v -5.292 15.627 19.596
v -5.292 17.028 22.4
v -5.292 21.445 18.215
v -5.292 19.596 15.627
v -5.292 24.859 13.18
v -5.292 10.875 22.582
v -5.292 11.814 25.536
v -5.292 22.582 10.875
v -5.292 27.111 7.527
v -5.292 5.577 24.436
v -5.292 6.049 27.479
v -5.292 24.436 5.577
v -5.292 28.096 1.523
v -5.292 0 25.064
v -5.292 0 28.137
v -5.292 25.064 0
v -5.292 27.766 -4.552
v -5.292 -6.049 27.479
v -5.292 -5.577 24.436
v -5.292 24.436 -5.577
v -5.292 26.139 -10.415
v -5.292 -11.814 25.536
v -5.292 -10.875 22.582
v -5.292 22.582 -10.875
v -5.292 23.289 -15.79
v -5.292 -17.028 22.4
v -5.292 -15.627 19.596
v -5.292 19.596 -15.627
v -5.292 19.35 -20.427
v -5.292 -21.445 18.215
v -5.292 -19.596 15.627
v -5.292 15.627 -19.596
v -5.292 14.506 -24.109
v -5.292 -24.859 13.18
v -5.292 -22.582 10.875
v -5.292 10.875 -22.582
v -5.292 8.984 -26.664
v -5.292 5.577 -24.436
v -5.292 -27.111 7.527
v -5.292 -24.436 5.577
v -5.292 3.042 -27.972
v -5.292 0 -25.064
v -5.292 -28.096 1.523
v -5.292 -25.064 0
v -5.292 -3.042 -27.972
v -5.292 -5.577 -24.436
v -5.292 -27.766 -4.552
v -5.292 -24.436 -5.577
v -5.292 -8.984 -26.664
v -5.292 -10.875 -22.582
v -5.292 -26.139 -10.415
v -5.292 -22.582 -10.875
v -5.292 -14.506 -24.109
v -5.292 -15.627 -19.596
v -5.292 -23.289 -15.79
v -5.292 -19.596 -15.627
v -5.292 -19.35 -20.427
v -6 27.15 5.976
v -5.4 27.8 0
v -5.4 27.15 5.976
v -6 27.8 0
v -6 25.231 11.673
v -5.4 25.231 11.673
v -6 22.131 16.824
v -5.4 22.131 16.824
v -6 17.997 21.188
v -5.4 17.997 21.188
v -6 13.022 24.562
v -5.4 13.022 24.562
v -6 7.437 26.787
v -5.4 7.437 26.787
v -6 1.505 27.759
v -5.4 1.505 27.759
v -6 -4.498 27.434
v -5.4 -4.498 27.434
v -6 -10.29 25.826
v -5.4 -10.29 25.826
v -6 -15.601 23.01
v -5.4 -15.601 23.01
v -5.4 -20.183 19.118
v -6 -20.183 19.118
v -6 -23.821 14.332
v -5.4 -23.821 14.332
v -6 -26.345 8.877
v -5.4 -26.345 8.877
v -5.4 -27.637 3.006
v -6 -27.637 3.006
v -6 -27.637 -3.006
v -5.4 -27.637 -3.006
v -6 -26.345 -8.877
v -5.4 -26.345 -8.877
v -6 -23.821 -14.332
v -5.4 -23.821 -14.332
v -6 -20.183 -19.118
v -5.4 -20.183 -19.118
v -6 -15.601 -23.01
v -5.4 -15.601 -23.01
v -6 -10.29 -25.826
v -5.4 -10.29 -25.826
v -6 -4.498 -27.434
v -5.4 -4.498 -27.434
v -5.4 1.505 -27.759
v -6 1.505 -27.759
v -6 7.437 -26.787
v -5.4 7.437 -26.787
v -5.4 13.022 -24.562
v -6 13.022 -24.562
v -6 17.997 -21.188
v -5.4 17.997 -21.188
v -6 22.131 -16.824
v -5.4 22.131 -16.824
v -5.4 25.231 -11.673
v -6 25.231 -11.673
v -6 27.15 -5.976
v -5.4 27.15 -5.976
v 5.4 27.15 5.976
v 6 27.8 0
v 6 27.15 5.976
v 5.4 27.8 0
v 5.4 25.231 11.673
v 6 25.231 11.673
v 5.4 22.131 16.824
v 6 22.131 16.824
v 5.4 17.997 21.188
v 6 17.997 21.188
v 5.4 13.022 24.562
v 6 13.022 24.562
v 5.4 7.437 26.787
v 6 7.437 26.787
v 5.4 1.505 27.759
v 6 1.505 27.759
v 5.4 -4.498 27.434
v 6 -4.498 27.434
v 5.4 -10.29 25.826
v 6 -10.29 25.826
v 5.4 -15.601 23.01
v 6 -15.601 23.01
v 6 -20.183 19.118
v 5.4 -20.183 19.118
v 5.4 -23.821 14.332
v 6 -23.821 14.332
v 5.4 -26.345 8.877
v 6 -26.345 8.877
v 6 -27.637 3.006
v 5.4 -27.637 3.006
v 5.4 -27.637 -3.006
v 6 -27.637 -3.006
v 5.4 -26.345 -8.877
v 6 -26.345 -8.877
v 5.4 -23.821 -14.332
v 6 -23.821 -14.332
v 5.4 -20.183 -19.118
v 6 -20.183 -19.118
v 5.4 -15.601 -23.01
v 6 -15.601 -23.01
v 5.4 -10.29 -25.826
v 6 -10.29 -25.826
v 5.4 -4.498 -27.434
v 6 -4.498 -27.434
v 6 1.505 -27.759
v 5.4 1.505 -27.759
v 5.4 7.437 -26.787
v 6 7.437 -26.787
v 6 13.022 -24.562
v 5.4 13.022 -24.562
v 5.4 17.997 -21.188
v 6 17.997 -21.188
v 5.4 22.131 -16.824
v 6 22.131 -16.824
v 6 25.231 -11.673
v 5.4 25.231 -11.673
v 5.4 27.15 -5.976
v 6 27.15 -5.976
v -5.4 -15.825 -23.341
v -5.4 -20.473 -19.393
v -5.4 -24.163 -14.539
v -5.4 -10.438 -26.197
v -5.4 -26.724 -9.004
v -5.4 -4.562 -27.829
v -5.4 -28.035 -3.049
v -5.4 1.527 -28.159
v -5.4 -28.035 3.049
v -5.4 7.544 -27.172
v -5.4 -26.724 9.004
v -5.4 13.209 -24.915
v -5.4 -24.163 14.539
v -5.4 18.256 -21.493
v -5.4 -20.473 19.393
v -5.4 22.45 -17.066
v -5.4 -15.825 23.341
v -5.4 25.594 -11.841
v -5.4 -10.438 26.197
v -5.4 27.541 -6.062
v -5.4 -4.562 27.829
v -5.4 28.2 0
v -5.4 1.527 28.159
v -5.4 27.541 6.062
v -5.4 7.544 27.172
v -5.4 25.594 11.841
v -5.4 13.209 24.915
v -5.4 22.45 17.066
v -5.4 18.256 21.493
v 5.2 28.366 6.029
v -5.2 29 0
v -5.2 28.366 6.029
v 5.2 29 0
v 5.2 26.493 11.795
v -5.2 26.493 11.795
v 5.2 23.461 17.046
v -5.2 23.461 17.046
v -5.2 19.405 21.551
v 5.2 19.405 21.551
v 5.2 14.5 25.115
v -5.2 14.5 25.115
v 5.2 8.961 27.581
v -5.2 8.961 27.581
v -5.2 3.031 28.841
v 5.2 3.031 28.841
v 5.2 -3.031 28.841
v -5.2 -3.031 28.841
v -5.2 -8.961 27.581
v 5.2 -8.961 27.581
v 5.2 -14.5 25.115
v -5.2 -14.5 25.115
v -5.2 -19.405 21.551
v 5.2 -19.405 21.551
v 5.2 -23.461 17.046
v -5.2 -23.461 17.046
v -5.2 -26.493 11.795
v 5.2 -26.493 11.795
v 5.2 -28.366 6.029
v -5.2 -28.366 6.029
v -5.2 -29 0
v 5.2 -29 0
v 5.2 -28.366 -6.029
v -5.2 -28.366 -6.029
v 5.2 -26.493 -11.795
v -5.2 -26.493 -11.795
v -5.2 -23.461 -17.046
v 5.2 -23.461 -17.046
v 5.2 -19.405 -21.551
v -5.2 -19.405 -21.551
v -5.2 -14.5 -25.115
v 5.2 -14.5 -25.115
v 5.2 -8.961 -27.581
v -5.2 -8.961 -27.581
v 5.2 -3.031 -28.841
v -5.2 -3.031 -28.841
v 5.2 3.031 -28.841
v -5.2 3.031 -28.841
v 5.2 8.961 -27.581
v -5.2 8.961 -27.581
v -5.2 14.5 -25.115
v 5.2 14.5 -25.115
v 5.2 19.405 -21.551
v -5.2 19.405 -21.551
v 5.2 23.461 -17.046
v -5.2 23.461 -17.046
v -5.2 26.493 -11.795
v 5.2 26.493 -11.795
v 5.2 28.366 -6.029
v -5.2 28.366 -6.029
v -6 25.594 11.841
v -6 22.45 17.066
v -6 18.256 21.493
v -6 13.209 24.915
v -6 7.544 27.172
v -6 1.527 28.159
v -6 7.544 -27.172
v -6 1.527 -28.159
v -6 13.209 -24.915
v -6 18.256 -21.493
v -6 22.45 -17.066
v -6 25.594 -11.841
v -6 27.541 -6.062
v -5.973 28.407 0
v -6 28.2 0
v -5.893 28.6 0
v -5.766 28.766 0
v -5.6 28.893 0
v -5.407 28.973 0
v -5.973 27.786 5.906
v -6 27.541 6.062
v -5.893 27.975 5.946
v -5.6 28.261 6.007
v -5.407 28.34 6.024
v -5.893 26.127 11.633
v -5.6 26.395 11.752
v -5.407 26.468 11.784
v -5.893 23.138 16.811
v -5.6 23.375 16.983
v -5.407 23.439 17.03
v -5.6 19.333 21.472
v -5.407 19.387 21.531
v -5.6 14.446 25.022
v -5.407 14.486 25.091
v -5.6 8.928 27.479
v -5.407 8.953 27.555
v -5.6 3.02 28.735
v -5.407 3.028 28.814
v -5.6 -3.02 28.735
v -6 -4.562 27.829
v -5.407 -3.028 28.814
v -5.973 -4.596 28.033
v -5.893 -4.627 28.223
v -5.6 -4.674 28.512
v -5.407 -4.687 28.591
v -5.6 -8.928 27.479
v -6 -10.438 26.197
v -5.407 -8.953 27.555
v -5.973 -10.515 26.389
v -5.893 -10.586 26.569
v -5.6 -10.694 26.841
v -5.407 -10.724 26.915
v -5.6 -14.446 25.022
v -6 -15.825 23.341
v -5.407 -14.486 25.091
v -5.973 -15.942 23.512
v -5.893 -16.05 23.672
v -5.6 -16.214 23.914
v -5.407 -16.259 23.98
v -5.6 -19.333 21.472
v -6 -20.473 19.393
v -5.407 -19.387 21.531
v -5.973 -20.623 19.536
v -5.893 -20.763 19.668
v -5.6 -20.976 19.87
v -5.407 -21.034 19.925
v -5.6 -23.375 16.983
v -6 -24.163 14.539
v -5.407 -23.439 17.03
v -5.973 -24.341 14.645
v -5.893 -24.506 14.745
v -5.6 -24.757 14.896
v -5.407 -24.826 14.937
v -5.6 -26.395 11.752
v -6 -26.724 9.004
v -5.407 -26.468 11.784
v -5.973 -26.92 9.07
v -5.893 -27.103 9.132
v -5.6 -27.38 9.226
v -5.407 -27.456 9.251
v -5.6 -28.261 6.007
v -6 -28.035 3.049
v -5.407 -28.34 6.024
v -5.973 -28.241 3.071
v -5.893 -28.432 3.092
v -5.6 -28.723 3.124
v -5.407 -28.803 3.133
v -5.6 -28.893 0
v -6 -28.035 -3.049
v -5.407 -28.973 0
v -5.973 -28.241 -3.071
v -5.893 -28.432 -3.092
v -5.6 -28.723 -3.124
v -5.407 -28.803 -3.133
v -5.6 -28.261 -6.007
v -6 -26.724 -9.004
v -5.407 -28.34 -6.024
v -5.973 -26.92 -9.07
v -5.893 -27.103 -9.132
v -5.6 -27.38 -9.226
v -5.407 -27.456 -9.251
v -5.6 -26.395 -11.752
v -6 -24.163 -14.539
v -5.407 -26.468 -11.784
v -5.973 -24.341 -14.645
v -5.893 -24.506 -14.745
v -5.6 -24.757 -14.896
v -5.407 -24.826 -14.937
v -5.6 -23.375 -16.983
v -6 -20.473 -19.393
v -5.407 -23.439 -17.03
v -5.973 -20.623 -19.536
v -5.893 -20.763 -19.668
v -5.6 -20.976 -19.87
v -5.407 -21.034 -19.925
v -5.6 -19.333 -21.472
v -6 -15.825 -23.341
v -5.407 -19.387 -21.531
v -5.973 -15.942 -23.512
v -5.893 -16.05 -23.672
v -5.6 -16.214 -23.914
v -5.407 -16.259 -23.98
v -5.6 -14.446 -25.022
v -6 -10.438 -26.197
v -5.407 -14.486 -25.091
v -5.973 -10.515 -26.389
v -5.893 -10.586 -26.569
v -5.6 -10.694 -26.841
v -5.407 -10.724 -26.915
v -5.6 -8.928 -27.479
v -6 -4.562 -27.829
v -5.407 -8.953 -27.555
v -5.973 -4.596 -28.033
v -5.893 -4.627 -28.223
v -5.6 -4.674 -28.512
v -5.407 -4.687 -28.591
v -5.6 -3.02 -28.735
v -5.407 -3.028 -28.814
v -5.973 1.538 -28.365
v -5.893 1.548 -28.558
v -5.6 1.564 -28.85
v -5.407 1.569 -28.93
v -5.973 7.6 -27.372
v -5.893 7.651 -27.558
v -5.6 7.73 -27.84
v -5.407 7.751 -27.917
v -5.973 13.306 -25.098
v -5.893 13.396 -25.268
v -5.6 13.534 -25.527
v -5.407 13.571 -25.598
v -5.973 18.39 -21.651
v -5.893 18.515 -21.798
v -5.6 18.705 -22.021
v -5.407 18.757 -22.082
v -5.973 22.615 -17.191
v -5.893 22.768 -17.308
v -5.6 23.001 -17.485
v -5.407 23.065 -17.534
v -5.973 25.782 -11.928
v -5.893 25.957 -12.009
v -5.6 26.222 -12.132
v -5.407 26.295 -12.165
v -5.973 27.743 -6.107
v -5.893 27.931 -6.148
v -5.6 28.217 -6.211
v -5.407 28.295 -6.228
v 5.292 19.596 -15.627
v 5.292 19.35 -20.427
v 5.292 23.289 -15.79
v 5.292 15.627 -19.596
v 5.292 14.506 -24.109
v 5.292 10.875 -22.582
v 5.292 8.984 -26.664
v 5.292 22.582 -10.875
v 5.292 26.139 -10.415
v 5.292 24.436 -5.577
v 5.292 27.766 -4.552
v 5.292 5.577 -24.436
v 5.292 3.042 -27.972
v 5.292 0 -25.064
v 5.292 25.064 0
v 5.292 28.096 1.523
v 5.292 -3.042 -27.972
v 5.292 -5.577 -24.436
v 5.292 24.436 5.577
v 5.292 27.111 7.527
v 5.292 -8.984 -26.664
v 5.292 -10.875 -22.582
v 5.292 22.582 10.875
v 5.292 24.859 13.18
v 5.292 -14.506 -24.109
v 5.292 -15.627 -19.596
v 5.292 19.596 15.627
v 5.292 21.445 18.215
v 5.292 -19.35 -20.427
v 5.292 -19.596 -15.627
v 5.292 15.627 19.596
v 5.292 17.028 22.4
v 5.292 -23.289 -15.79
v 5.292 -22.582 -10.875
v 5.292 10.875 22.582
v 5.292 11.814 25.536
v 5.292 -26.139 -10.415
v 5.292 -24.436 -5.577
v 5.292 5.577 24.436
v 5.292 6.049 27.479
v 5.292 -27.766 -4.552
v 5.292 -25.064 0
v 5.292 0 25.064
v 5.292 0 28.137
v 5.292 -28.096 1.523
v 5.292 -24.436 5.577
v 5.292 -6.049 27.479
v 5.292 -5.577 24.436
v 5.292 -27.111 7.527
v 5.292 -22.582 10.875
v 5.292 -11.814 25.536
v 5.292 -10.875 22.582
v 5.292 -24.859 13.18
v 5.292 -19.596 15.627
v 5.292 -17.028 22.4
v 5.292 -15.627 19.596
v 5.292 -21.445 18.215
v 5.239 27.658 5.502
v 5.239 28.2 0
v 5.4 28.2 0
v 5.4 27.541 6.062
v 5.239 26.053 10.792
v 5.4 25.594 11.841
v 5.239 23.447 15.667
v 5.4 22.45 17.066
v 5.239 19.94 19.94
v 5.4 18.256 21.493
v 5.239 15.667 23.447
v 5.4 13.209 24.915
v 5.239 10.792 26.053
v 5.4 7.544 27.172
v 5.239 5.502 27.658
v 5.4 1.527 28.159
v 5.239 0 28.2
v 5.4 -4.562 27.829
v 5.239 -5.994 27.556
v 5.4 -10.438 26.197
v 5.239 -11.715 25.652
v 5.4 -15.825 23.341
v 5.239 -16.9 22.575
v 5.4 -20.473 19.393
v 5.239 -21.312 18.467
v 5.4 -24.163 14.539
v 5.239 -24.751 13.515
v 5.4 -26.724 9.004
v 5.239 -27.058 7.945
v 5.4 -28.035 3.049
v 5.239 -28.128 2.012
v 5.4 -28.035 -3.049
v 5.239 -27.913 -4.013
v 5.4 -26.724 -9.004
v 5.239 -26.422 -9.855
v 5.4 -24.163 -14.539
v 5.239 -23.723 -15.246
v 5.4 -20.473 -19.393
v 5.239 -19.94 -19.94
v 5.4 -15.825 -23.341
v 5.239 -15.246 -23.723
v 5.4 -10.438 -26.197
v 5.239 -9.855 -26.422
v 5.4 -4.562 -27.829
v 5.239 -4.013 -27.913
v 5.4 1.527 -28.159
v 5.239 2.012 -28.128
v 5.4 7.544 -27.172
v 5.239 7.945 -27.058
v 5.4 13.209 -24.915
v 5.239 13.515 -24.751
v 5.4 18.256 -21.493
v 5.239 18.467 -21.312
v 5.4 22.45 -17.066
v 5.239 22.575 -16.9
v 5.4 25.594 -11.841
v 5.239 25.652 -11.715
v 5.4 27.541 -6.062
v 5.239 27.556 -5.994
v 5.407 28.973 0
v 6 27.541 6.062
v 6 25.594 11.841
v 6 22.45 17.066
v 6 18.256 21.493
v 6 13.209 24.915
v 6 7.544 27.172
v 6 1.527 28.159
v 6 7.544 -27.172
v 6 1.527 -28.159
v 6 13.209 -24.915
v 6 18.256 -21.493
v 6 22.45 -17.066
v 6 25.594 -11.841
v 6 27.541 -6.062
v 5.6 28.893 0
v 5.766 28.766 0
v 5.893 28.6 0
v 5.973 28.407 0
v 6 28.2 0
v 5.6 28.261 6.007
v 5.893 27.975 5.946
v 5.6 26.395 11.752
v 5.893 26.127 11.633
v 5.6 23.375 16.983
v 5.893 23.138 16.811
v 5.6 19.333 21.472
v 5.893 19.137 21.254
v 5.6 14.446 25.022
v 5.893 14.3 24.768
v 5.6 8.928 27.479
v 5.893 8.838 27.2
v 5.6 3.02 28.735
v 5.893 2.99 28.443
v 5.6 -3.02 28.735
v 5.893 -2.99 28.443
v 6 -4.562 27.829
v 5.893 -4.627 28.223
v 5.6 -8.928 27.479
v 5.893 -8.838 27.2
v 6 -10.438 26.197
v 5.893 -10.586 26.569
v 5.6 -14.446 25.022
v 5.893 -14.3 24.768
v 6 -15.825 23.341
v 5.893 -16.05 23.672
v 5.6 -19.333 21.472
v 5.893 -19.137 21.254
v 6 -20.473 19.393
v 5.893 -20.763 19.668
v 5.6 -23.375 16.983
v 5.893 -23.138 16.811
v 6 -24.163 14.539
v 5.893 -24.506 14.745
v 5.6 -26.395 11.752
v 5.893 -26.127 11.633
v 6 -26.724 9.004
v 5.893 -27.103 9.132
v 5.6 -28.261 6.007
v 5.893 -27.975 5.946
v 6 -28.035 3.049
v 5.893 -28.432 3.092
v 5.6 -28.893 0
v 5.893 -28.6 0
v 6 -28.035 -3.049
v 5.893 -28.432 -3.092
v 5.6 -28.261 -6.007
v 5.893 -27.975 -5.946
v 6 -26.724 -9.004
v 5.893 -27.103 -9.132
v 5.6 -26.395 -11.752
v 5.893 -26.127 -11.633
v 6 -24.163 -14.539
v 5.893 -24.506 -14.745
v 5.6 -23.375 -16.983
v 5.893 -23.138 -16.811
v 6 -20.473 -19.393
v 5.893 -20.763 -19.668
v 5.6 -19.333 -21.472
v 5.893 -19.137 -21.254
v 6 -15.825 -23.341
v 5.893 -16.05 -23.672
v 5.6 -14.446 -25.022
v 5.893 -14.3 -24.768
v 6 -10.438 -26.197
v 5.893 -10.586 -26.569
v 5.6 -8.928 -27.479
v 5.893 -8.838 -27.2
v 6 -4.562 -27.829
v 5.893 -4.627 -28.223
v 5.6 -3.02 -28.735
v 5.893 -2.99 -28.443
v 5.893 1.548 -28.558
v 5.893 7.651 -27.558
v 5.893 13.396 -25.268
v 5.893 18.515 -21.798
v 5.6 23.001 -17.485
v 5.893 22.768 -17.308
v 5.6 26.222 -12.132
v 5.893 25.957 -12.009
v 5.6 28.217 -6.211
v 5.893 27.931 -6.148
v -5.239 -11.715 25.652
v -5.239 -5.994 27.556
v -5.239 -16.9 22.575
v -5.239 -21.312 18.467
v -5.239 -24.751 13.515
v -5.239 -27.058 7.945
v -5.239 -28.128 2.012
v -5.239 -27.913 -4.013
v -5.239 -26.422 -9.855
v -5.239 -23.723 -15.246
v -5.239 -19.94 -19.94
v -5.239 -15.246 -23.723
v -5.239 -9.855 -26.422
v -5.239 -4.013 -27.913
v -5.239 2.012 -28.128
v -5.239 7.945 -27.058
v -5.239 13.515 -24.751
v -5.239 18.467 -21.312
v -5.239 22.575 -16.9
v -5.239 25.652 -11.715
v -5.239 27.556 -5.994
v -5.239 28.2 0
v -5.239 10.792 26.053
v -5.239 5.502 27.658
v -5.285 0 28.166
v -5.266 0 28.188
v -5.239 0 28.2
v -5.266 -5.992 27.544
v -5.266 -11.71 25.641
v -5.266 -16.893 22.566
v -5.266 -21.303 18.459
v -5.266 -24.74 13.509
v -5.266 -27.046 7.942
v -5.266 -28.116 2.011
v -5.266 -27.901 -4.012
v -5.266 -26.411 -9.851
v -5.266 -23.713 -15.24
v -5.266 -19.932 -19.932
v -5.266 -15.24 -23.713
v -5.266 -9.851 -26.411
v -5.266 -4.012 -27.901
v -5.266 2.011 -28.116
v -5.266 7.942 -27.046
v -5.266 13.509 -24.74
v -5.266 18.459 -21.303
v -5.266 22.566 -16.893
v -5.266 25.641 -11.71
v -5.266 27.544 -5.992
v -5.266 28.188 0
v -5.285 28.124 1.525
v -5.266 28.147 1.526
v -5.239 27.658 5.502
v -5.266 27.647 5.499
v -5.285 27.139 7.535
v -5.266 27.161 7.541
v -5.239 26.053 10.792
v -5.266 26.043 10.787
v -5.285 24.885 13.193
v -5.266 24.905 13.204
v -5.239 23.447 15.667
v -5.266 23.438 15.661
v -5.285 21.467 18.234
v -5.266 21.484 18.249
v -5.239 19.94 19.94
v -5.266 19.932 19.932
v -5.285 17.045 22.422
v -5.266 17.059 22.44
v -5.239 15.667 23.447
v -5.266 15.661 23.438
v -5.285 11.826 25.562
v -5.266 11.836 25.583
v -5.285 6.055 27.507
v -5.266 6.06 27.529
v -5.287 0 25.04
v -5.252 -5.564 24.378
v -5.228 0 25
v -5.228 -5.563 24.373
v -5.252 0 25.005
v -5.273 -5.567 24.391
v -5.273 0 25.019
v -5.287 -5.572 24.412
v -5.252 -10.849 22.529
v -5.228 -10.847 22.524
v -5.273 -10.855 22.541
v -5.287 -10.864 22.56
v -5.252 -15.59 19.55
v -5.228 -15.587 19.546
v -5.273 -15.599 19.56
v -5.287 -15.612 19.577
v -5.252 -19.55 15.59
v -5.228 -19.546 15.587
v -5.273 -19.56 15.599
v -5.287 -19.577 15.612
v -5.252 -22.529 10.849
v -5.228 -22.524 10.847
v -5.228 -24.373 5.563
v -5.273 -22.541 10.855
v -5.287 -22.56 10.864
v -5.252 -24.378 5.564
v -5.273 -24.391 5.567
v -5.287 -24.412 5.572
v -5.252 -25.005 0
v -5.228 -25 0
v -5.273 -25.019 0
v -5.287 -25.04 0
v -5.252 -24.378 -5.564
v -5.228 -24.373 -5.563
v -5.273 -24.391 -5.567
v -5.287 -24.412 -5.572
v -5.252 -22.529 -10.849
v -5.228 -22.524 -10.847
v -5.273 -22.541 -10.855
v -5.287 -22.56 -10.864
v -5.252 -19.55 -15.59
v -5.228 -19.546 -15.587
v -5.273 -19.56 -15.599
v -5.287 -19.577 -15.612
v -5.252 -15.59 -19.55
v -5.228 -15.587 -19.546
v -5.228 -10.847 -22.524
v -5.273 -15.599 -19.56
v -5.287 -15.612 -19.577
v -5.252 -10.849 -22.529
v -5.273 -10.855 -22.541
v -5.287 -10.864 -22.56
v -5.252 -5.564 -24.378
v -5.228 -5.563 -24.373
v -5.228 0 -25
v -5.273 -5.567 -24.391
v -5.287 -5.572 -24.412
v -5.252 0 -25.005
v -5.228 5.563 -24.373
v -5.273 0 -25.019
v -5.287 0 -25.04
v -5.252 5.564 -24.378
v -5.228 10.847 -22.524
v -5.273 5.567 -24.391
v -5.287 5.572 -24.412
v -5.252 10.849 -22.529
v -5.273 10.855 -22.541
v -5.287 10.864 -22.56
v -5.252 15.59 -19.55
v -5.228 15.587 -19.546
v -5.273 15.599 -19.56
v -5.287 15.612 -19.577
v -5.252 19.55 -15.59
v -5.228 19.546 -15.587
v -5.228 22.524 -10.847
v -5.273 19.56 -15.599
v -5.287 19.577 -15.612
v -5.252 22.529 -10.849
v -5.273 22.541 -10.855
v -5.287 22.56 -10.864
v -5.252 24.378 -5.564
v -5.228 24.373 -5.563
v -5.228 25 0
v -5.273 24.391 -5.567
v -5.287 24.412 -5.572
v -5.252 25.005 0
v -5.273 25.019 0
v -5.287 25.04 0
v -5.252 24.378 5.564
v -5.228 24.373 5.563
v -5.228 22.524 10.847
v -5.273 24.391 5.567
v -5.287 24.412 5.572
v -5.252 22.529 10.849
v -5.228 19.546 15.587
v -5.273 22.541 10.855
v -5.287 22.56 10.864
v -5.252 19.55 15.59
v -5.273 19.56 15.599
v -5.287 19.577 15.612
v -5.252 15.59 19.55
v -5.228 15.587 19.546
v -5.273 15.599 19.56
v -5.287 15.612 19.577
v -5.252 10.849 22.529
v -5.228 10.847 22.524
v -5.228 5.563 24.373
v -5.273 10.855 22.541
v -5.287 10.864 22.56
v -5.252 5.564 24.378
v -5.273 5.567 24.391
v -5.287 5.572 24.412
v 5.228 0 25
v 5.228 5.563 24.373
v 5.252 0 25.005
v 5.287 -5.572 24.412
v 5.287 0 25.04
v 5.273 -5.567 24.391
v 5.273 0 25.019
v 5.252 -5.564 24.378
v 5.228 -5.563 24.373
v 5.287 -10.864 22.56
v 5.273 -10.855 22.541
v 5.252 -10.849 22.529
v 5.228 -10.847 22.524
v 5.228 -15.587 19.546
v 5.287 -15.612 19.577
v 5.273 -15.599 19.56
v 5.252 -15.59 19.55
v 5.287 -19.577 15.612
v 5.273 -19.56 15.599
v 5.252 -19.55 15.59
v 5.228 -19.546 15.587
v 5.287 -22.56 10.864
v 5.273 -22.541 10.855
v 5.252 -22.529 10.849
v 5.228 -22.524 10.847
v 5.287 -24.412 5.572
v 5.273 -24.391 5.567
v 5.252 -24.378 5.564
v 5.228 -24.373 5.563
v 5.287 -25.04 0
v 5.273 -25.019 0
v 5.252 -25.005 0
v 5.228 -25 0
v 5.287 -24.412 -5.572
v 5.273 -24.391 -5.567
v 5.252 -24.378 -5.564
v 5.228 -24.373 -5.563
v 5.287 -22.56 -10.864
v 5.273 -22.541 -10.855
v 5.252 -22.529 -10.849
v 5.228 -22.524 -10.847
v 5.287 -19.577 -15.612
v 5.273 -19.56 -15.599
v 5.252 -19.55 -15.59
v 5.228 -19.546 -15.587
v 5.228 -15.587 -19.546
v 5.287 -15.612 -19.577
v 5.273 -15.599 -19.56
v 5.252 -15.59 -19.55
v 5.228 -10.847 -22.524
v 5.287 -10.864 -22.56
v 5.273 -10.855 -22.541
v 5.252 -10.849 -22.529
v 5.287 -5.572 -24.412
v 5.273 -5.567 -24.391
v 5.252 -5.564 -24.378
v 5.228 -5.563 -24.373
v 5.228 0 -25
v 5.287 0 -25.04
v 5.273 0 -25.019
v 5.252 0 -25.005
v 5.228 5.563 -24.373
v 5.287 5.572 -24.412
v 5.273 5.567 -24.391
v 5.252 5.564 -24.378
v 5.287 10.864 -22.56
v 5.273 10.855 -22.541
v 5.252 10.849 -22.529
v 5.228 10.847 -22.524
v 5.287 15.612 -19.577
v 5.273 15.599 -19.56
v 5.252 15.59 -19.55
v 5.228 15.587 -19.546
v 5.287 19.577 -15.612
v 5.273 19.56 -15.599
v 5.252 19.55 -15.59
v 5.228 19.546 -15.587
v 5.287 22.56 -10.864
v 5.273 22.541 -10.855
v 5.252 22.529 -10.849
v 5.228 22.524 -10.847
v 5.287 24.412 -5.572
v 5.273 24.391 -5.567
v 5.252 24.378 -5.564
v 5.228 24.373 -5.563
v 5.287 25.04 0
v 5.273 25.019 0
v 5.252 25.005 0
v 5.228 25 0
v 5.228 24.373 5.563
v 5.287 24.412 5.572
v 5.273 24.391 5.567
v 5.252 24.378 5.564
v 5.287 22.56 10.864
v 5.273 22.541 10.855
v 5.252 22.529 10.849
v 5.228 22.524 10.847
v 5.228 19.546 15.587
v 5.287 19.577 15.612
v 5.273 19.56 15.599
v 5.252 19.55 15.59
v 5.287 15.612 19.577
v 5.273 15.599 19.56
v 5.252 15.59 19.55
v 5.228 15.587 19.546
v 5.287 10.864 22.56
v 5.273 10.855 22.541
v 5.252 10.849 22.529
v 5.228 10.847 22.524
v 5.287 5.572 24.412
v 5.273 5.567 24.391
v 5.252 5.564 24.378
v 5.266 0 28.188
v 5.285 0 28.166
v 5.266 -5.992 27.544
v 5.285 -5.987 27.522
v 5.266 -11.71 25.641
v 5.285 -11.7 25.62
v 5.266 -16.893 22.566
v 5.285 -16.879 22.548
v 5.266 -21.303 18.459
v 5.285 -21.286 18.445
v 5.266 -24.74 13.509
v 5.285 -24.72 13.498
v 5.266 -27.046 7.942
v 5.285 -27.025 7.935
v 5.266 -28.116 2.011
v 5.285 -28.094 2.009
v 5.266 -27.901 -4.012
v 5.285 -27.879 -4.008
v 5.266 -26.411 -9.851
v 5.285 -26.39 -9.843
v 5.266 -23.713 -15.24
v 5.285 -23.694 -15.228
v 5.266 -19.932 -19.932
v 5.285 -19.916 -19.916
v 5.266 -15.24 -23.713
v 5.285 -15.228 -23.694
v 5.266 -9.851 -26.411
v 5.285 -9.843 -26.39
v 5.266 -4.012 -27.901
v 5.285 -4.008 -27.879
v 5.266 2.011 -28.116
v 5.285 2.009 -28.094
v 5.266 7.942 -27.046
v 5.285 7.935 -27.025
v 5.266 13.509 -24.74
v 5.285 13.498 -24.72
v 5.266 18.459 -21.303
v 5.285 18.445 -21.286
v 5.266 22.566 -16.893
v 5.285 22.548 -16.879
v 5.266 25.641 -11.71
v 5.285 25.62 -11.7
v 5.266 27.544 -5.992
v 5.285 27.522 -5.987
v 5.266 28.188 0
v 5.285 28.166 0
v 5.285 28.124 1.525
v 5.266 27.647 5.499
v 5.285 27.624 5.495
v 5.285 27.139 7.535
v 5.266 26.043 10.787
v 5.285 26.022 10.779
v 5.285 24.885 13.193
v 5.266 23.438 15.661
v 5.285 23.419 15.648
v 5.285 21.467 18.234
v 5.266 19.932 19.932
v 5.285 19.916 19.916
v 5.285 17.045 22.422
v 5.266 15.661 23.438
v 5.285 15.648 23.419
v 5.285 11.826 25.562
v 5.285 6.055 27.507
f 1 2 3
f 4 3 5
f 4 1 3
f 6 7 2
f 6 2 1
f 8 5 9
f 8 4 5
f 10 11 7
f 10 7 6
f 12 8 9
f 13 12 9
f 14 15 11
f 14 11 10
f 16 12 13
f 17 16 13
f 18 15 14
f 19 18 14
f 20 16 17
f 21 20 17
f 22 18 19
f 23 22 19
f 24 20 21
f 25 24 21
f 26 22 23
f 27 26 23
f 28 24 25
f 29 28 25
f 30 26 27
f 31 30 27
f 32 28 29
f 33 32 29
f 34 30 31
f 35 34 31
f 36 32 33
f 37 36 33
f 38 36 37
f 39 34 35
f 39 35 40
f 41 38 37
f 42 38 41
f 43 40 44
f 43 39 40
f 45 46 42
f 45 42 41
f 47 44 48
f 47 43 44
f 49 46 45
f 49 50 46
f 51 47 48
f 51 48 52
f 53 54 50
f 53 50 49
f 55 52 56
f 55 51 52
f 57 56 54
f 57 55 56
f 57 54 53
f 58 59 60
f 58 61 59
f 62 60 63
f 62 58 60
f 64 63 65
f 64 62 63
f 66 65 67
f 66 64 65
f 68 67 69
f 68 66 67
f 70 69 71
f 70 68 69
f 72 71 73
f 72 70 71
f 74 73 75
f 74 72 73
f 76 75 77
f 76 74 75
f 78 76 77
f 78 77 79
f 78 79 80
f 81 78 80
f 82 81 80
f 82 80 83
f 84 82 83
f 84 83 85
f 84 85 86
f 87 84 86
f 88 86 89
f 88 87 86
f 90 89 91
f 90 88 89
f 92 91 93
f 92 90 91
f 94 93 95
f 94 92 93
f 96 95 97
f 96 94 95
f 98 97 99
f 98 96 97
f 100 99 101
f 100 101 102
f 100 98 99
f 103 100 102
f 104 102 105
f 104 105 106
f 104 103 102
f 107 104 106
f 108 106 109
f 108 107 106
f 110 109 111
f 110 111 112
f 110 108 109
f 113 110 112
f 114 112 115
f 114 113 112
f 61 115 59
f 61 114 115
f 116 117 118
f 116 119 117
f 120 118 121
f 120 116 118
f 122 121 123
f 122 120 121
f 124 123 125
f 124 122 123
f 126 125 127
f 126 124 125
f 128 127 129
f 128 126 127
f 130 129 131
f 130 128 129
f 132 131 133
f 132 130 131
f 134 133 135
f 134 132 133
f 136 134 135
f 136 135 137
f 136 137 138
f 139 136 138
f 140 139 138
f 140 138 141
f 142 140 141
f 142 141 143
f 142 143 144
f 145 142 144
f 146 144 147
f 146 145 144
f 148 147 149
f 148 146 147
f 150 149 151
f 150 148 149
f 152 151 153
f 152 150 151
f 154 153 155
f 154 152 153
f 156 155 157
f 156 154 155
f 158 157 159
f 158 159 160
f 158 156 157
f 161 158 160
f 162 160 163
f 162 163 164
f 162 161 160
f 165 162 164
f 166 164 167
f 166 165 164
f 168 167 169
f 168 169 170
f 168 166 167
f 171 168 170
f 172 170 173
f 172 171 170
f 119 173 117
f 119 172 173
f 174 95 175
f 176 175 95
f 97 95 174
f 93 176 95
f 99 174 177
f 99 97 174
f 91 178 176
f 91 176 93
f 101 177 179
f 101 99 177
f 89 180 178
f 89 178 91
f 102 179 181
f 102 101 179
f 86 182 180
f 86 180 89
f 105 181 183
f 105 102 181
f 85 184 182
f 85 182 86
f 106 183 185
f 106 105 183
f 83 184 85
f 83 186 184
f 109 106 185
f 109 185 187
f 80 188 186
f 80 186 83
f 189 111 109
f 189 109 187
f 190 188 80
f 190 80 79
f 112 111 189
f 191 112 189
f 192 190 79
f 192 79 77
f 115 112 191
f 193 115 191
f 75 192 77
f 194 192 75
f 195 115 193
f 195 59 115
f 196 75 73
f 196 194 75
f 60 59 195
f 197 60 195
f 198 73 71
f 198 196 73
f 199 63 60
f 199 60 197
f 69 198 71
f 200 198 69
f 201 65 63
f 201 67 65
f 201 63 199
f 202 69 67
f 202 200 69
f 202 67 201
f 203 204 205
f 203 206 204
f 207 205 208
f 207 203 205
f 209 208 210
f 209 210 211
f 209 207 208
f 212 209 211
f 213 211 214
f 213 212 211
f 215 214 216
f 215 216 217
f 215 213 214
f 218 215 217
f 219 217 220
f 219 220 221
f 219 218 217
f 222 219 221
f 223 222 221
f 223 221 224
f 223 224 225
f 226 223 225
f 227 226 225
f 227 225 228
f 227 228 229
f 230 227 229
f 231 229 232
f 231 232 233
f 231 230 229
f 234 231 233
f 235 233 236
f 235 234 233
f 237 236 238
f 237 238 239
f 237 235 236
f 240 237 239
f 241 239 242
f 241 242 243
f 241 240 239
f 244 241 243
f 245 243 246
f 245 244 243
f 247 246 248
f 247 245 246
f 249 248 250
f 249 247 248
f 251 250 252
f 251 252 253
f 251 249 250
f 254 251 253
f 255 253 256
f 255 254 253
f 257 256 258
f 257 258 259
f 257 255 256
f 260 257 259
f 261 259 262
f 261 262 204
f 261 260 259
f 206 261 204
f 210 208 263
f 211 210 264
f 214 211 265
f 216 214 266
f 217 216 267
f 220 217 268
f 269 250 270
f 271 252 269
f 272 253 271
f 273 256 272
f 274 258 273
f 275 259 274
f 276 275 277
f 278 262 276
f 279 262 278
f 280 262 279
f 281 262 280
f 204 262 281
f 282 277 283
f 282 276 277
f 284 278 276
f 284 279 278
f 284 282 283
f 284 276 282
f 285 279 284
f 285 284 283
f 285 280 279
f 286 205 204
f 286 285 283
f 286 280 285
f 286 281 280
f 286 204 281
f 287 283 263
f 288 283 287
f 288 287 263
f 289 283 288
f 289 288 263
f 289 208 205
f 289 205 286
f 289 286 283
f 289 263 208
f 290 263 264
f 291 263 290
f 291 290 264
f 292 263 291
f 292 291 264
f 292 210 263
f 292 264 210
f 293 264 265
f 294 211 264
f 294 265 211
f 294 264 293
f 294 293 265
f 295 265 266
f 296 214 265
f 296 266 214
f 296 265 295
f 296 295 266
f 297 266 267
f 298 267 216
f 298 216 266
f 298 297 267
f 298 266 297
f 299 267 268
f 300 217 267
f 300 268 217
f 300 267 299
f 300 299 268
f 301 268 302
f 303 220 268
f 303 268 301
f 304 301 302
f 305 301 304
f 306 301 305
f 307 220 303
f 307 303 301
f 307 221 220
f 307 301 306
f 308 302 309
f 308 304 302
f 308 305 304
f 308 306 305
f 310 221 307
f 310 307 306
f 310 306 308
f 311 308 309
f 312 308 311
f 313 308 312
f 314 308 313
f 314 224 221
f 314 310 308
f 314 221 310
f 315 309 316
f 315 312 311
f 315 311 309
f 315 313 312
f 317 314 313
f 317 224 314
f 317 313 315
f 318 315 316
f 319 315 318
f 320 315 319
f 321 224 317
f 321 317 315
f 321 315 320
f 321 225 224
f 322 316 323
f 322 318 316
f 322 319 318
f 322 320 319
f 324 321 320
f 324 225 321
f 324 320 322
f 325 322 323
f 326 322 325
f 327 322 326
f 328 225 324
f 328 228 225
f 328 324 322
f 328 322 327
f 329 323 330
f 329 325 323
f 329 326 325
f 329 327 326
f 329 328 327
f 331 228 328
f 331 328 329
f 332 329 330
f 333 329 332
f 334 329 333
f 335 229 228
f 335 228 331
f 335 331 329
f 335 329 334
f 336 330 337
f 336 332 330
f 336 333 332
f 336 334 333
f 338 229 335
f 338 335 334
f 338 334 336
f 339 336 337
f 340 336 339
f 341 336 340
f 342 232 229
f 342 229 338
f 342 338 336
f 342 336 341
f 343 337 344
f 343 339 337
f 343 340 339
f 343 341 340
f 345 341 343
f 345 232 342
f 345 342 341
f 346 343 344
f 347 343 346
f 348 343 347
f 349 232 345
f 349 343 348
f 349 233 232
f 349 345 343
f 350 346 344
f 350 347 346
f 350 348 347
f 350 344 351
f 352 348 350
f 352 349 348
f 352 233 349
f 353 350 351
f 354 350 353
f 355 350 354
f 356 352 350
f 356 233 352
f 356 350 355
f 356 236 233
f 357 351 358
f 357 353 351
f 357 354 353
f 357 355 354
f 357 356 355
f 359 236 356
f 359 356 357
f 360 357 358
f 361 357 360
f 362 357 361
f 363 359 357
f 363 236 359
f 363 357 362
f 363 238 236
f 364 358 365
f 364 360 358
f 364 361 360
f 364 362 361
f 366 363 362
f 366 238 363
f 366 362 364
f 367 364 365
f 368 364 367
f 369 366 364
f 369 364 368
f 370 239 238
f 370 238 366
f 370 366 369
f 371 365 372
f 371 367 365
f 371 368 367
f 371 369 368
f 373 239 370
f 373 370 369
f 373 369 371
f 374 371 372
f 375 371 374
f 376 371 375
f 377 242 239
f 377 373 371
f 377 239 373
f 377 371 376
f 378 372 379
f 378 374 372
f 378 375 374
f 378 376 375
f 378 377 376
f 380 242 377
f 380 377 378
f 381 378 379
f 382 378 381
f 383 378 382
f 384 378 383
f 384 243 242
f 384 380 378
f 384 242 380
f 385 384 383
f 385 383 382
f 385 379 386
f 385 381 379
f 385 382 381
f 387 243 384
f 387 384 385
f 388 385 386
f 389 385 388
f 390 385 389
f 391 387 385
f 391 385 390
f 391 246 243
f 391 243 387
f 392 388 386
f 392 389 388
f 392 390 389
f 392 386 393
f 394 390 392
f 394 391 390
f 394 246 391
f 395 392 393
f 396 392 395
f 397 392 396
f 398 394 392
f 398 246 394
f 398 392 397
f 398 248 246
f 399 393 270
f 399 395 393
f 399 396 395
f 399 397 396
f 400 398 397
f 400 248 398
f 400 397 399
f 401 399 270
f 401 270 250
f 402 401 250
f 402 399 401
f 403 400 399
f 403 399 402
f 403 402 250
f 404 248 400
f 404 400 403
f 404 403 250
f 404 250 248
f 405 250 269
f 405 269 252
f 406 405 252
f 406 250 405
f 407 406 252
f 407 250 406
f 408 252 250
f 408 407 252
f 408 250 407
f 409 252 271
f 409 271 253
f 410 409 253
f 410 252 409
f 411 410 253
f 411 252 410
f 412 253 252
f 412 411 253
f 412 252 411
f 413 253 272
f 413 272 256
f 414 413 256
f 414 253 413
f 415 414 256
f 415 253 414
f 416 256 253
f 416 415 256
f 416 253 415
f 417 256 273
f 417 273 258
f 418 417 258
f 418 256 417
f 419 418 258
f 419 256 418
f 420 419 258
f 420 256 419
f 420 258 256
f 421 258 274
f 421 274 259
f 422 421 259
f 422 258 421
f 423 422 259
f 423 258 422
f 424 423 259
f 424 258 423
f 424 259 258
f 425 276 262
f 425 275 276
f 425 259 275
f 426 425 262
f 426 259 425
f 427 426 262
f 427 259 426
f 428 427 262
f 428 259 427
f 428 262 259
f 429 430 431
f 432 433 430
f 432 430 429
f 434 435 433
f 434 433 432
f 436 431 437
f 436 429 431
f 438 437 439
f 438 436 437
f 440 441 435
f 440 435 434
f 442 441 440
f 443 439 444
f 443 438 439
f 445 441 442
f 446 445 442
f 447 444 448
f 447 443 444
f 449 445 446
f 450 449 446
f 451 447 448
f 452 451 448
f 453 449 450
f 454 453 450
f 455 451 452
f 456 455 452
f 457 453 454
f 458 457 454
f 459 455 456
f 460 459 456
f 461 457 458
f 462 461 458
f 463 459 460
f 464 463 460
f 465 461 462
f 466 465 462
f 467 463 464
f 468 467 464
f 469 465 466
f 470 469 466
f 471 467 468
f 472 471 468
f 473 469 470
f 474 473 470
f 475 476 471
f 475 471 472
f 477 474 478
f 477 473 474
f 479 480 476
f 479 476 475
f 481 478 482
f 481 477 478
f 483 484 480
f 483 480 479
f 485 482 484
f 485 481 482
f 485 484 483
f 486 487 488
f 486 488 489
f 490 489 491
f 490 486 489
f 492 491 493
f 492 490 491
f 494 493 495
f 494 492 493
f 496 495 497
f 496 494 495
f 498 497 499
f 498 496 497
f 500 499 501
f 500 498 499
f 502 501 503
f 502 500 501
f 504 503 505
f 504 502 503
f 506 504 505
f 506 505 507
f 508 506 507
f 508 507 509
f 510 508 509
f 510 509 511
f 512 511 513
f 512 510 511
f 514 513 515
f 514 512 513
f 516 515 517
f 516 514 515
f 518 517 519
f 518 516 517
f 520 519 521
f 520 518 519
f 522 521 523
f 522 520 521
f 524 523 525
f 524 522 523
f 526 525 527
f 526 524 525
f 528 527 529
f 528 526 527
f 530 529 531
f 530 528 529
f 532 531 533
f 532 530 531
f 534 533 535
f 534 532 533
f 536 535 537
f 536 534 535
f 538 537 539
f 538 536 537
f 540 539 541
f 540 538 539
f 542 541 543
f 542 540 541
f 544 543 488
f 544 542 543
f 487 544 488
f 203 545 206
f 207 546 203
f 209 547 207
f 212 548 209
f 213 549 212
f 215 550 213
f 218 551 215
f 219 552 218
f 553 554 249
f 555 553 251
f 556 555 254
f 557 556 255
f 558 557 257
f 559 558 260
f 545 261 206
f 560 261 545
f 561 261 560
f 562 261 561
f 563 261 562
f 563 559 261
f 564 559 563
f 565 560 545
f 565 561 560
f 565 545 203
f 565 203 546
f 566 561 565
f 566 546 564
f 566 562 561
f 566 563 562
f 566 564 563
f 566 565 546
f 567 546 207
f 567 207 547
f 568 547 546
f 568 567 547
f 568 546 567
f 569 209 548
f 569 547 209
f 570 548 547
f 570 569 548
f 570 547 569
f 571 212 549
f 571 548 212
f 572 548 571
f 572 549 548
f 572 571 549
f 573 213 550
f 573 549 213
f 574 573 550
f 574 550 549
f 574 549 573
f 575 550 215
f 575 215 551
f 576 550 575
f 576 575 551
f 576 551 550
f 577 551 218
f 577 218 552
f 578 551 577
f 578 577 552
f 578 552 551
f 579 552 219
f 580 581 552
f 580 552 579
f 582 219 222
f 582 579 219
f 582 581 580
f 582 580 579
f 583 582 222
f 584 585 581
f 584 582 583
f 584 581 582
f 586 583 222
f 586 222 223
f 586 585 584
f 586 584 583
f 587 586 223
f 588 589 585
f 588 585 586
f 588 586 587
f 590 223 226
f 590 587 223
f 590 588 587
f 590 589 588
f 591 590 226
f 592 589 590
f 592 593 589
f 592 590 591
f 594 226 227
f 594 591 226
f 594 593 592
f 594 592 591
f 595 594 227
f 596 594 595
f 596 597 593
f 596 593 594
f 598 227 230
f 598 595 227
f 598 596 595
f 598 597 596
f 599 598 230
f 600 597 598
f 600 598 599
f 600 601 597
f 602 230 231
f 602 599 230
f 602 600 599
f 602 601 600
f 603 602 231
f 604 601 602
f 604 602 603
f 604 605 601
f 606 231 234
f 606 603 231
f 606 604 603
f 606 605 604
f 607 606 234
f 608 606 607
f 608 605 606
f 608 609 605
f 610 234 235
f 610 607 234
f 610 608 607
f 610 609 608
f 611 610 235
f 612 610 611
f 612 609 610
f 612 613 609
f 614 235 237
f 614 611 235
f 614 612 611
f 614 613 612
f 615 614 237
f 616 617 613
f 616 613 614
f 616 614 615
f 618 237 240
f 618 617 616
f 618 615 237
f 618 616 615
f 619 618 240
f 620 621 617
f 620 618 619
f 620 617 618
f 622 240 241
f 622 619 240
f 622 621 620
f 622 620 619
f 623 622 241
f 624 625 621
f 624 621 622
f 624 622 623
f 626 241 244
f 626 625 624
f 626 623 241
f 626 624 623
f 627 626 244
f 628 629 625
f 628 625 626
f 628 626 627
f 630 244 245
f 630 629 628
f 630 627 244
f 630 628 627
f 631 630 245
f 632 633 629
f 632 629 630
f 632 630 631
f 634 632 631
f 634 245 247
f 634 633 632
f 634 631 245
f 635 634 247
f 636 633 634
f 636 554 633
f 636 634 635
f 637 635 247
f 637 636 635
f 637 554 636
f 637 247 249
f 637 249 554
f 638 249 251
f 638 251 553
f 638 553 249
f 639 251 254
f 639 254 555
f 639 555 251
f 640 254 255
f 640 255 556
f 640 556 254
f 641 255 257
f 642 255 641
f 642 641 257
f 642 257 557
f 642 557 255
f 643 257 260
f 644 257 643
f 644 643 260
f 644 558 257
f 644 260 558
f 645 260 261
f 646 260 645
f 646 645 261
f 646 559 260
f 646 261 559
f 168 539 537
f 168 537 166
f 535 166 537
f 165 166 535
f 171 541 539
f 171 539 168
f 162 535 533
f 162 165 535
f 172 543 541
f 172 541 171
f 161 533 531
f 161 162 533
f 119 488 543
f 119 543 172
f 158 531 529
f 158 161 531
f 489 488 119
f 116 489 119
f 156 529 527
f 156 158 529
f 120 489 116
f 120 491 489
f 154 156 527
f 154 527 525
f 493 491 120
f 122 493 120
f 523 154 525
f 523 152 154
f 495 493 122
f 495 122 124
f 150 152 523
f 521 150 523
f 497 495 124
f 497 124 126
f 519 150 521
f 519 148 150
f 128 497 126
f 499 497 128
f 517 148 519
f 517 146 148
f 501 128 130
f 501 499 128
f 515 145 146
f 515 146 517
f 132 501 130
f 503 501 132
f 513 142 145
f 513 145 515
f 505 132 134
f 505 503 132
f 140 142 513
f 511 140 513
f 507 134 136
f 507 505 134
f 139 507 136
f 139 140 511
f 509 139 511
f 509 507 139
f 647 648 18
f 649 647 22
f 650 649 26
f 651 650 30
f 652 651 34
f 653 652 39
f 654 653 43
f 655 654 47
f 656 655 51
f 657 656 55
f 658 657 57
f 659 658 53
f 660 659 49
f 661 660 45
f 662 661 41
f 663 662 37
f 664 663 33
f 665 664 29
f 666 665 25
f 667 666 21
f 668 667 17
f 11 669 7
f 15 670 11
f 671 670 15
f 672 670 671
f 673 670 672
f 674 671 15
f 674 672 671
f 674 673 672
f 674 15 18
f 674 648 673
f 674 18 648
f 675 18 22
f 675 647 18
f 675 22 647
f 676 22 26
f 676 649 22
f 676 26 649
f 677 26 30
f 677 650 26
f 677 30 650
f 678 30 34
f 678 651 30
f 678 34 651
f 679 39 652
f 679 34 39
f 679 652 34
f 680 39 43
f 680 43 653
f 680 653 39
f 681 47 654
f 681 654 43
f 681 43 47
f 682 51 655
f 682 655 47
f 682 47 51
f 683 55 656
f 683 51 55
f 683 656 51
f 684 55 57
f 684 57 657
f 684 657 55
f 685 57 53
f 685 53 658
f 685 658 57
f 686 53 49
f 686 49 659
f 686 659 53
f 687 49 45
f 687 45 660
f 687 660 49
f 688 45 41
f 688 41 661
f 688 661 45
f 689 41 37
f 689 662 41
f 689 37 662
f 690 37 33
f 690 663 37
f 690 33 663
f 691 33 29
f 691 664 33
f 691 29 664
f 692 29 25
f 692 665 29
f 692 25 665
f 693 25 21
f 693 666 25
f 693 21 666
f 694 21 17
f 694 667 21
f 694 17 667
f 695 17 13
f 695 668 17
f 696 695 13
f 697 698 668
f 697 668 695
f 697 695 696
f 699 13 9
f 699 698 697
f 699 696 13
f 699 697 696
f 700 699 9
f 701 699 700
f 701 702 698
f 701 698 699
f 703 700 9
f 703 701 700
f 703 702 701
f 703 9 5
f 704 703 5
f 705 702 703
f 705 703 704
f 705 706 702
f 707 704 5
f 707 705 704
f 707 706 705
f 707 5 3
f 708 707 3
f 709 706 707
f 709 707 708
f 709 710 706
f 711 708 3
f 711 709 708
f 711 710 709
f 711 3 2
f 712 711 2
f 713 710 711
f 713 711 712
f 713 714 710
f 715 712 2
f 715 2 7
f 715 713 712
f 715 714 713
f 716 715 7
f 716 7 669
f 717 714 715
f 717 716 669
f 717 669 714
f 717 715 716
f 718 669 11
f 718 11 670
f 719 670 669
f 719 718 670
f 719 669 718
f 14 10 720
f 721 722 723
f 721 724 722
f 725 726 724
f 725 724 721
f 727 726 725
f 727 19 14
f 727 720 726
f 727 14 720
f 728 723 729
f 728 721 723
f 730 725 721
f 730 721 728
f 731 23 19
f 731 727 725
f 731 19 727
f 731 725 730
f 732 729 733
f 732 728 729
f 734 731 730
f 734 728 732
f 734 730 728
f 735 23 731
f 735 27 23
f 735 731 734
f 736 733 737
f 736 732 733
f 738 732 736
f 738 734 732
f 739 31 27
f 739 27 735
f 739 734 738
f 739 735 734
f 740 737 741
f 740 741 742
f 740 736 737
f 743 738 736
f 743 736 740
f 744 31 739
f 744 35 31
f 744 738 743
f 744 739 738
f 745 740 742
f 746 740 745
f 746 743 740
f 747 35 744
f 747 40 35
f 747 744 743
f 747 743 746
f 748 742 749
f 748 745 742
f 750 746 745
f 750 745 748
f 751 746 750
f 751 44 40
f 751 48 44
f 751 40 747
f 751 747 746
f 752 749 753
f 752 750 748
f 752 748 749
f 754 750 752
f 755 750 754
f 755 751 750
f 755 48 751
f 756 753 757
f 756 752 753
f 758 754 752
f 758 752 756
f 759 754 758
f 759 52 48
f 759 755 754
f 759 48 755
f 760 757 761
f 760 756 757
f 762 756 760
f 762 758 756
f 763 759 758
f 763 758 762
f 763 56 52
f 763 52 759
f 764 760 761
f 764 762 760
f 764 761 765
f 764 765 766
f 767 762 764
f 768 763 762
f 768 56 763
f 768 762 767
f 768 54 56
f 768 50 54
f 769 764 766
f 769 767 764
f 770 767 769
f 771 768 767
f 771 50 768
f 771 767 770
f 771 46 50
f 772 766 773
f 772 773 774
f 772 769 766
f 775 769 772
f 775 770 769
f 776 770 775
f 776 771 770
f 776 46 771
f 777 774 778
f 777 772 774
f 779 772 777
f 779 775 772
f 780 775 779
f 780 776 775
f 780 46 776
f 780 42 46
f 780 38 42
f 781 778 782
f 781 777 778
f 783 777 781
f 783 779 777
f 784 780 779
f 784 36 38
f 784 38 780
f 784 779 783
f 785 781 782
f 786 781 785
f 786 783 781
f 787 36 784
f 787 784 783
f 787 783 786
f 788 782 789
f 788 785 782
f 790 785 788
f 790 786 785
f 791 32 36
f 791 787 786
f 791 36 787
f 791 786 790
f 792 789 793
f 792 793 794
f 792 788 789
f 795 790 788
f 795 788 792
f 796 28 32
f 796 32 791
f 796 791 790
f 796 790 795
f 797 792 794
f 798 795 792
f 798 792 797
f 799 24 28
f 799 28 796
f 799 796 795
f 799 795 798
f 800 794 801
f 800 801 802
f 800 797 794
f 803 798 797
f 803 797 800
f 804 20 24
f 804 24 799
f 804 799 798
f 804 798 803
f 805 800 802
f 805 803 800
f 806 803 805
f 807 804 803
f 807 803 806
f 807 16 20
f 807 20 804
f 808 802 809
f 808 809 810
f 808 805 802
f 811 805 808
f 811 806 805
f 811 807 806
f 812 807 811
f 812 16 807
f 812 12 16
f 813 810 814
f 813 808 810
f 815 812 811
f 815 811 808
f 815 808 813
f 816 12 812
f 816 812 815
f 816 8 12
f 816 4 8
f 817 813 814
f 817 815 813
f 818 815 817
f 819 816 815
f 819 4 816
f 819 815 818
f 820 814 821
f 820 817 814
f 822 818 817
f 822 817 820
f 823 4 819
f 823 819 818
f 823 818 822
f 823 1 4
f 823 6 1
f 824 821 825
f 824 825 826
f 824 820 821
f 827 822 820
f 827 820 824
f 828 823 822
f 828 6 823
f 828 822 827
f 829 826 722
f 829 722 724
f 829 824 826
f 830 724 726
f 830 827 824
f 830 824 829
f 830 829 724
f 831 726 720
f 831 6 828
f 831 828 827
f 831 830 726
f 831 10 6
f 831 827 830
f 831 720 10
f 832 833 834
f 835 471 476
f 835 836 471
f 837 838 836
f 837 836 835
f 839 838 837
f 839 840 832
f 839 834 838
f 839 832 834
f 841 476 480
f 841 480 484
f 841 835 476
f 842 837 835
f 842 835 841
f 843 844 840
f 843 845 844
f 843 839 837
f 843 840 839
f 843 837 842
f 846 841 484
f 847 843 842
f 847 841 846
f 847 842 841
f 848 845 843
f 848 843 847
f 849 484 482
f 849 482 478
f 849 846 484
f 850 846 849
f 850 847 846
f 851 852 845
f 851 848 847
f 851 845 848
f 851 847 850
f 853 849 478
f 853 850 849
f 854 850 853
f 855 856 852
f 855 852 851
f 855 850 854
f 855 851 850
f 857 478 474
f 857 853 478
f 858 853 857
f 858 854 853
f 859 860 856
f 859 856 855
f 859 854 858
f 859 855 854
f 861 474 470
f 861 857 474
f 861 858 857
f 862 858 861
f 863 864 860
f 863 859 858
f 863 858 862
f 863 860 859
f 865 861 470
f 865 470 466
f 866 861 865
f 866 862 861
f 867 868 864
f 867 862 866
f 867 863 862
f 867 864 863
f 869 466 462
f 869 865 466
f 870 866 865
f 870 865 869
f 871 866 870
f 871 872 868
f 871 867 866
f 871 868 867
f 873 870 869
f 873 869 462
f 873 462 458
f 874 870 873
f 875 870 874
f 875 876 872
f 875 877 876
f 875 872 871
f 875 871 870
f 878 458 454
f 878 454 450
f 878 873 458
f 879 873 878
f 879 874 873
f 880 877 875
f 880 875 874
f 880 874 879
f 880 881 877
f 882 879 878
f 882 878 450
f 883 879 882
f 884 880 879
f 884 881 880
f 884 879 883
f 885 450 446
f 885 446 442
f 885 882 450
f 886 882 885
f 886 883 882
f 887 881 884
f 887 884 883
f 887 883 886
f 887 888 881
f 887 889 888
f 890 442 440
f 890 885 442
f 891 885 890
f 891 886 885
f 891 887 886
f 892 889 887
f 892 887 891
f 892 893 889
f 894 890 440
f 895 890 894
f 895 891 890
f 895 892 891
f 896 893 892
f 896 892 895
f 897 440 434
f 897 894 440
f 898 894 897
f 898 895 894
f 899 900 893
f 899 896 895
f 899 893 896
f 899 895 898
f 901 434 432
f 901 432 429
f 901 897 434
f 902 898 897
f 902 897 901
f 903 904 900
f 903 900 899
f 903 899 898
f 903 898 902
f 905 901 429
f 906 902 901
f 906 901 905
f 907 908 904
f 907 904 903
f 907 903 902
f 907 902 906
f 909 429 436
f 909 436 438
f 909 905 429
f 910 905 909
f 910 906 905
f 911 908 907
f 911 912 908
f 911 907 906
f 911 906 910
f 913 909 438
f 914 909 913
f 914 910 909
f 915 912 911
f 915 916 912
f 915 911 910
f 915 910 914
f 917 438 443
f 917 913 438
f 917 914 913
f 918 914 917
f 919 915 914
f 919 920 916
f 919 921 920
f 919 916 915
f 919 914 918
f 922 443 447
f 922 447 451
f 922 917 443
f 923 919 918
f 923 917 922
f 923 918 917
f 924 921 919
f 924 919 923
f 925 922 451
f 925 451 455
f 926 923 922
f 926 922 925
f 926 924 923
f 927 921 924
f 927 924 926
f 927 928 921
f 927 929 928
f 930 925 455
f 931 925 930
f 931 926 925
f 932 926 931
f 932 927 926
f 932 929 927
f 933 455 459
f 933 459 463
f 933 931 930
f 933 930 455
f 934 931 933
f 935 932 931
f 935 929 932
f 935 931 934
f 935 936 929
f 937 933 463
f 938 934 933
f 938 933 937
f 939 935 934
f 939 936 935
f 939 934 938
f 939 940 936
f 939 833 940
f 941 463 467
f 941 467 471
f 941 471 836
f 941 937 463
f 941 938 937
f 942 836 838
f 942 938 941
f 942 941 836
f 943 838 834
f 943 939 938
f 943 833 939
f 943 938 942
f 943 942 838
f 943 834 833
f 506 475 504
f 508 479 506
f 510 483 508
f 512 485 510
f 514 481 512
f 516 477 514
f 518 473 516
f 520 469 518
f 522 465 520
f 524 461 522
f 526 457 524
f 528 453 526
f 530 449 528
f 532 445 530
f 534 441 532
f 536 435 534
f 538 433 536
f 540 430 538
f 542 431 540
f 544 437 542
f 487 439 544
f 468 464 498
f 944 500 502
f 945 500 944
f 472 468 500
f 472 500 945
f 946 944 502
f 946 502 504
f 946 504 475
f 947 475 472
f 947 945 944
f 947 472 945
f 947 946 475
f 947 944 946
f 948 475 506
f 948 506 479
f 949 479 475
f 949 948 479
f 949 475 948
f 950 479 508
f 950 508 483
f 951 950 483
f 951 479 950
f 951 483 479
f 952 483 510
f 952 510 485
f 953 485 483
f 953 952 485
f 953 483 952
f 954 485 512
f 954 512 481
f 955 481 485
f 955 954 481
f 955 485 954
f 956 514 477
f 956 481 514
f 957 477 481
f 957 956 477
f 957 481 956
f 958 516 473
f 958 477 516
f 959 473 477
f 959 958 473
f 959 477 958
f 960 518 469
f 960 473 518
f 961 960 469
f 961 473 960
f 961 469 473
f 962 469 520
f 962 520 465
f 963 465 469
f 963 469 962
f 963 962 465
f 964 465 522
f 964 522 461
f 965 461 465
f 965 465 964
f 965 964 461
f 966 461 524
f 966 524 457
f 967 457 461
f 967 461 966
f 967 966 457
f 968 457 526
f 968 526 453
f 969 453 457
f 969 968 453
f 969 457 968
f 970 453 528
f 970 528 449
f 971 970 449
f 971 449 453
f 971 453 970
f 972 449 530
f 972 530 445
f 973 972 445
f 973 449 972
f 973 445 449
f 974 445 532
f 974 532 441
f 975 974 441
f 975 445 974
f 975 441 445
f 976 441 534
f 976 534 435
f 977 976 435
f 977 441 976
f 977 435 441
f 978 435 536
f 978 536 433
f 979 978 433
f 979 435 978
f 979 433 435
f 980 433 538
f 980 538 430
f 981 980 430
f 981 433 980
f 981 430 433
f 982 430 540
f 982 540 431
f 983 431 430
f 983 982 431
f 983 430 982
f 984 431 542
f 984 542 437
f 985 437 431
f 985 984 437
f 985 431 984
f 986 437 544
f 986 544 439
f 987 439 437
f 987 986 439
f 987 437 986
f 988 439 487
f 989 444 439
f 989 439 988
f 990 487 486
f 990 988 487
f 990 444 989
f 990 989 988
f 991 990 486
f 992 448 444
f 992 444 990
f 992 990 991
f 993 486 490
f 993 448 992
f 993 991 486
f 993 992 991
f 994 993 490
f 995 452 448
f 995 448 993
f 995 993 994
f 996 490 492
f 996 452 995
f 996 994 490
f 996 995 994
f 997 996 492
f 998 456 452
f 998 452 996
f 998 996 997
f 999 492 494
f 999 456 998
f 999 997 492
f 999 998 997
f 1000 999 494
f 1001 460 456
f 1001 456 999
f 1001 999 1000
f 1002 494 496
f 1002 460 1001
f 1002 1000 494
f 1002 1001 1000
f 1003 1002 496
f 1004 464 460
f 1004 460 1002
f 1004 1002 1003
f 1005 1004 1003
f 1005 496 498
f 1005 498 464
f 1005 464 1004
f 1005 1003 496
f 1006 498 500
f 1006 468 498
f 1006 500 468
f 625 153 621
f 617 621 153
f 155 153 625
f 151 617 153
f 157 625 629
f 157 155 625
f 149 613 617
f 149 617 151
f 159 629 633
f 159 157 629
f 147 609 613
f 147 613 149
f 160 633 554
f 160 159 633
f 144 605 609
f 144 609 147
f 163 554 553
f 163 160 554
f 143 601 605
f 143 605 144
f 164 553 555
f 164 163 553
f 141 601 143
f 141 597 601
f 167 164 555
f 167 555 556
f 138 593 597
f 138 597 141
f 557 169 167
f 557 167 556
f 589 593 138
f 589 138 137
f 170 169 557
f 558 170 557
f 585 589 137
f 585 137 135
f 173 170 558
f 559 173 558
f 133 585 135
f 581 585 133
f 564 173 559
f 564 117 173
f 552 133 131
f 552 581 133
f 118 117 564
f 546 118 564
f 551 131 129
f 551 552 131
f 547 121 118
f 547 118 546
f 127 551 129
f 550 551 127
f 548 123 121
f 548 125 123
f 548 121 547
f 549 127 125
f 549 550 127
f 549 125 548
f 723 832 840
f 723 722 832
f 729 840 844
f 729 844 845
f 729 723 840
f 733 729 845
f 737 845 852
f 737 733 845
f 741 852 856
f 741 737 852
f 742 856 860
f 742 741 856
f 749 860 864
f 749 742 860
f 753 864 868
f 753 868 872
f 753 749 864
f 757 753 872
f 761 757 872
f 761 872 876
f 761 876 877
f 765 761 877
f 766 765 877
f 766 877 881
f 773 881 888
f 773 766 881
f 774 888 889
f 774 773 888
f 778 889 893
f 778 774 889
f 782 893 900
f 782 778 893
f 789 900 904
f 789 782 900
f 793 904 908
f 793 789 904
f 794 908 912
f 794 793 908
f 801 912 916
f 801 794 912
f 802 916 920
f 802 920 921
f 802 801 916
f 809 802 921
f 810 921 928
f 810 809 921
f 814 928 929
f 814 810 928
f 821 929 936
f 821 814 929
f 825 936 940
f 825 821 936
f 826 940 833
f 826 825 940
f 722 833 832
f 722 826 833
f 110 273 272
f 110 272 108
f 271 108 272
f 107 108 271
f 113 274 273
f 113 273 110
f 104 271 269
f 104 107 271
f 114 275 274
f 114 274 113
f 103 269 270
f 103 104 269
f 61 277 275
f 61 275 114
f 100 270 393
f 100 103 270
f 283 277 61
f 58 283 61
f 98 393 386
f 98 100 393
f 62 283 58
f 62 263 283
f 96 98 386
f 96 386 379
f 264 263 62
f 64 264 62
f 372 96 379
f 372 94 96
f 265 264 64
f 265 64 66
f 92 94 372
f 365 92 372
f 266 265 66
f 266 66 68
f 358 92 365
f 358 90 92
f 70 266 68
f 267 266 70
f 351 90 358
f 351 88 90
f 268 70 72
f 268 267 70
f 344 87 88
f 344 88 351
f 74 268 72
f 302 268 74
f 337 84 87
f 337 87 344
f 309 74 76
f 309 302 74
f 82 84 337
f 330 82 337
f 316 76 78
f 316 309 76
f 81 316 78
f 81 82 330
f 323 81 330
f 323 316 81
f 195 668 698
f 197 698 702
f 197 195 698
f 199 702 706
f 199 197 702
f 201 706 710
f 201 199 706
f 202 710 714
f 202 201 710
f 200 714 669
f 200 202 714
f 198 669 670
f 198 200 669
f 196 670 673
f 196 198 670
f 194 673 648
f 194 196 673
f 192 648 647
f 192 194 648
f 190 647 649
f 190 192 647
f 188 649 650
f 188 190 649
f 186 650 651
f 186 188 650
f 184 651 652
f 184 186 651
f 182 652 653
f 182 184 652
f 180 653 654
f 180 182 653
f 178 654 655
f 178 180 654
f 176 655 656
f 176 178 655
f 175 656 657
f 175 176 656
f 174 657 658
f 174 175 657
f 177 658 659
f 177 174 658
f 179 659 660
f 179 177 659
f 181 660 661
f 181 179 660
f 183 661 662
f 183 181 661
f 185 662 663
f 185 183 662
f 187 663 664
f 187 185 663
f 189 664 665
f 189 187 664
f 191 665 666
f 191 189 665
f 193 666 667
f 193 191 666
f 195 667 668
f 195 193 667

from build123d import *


with BuildPart() as part:
    # InnRacSke → Race (revolve)
    with BuildSketch(Plane.XY):
        with BuildLine():
            Line((-5.4, 27.8), (-6, 27.8))
            Line((-6, 27.8), (-6, 28.2))
            ThreePointArc((-6, 28.2), (-5.765685425, 28.765685425), (-5.2, 29))
            Line((-5.2, 29), (5.2, 29))
            ThreePointArc((5.2, 29), (5.765685425, 28.765685425), (6, 28.2))
            Line((6, 28.2), (6, 27.8))
            Line((6, 27.8), (5.4, 27.8))
            Line((5.4, 27.8), (5.4, 28.2))
            Line((5.4, 28.2), (-5.4, 28.2))
            Line((-5.4, 28.2), (-5.4, 27.8))
        make_face()
    revolve(axis=Axis((-31.75, 0, 0), (1, 0, 0)))

    # RolSimSke → RollersSimplified (revolve)
    with BuildSketch(Plane.XY):
        with BuildLine():
            Line((-5.22798, 28.201), (5.22798, 28.201))
            ThreePointArc((5.22798, 28.201), (5.273248976, 28.182248976), (5.292, 28.13698))
            Line((5.292, 28.13698), (5.292, 25.06402))
            ThreePointArc((5.292, 25.06402), (5.273248976, 25.018751024), (5.22798, 25))
            Line((5.22798, 25), (-5.22798, 25))
            ThreePointArc((-5.22798, 25), (-5.273248976, 25.018751024), (-5.292, 25.06402))
            Line((-5.292, 25.06402), (-5.292, 28.13698))
            ThreePointArc((-5.292, 28.13698), (-5.273248976, 28.182248976), (-5.22798, 28.201))
        make_face()
    revolve(axis=Axis((-25.4, 0, 0), (1, 0, 0)))


solid = part.part
